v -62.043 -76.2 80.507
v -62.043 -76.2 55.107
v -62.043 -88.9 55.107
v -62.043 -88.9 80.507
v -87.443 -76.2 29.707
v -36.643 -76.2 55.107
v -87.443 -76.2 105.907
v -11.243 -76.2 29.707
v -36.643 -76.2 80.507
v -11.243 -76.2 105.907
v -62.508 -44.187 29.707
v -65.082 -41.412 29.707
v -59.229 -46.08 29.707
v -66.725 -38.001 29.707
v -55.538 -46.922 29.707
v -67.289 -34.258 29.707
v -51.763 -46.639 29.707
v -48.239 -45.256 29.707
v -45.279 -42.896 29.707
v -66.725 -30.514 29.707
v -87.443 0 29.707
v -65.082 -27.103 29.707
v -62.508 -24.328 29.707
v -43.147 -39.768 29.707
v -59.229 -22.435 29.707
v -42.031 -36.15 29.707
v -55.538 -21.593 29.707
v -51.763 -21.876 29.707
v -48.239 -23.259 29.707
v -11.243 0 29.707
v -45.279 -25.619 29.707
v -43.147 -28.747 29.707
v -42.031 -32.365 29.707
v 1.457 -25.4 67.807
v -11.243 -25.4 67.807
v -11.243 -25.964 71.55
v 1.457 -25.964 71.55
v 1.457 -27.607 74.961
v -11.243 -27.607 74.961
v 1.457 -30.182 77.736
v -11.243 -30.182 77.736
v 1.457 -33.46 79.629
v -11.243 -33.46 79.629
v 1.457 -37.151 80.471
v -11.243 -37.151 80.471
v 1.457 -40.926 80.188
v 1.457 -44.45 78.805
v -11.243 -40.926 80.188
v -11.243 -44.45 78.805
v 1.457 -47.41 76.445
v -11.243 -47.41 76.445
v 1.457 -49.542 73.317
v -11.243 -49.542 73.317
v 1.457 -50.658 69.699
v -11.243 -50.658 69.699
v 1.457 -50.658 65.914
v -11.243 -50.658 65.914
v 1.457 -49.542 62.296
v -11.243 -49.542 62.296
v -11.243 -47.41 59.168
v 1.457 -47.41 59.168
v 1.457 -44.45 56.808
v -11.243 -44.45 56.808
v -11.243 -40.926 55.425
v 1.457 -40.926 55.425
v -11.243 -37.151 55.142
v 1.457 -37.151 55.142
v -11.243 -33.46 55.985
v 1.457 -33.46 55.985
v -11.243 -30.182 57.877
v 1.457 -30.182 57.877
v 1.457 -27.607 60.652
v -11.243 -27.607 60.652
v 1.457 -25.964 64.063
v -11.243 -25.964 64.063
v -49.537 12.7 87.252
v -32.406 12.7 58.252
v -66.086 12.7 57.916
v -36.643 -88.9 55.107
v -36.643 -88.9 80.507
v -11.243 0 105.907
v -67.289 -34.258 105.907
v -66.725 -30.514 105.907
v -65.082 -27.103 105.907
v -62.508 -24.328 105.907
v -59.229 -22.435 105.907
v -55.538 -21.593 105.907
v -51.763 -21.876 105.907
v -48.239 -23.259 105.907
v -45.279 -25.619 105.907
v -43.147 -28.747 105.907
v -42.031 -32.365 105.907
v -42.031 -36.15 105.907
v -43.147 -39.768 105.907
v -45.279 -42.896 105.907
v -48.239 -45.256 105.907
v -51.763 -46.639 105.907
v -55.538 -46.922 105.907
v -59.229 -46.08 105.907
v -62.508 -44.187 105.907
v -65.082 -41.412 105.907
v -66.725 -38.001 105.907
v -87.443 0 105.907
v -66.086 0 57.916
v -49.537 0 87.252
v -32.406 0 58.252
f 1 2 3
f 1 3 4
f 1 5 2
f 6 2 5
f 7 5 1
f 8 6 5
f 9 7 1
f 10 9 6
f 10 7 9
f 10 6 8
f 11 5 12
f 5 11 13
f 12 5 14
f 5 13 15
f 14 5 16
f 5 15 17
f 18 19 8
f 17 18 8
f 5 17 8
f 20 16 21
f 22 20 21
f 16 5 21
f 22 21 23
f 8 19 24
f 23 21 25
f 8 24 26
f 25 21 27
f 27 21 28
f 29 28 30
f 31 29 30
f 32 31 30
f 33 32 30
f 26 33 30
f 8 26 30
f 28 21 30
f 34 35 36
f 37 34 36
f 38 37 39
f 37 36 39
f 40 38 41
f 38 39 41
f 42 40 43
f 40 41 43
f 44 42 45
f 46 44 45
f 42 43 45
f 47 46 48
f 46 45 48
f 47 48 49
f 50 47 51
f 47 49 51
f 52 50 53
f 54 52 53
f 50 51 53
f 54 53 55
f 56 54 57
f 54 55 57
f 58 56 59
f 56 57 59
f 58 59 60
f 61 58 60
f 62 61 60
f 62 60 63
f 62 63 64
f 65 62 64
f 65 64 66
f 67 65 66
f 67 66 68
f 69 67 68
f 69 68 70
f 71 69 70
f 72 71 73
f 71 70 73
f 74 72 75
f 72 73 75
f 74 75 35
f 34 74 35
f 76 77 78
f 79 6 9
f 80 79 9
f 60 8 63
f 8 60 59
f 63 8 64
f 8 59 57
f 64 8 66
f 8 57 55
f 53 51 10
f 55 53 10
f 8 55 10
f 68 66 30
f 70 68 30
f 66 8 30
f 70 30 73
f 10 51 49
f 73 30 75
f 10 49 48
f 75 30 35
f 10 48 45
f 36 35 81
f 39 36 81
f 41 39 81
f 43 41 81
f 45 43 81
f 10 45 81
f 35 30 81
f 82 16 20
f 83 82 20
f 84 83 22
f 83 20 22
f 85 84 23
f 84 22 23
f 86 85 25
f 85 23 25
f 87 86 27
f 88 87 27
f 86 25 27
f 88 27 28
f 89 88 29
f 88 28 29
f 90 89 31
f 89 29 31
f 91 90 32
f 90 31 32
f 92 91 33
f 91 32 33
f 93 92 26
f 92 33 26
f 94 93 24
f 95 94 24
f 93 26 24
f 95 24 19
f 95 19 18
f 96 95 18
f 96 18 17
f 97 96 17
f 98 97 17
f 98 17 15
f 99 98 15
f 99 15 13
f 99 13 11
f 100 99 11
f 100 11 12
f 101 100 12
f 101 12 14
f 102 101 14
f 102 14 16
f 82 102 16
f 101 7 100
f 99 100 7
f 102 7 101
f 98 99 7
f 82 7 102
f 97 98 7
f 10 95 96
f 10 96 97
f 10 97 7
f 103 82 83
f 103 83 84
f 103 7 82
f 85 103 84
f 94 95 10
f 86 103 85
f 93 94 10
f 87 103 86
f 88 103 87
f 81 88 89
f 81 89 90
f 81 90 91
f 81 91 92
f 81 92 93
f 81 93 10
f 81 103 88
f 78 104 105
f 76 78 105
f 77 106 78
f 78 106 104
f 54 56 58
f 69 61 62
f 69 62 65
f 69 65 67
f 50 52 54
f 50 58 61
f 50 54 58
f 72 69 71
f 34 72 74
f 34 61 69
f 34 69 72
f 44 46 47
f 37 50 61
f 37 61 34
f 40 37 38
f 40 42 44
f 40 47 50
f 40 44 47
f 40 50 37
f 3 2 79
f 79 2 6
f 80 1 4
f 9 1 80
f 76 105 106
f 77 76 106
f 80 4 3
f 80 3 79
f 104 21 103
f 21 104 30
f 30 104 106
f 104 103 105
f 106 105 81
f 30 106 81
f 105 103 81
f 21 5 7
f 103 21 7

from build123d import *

# Parameters (mm, degrees)
F0_W     = 76.2
F0_H     = 76.2
F1_DEPTH = 76.2
F2_R     = 12.7
F3_DEPTH = 12.7
F4_W     = 25.4
F4_H     = 25.4
F5_DEPTH = 12.7
F7_D     = 25.4
F9_DEPTH = 12.7


with BuildPart() as f1:
    # F0 (on Front) → F1 (new body)
    with BuildSketch(Plane.XZ):
        with Locations((-49.343084, 67.806647)):
            Rectangle(F0_W, F0_H)
    extrude(amount=F1_DEPTH)

    # F2 (on face) → F3 (join)
    with BuildSketch(Plane.YZ.offset(-11.243084)):
        with Locations((-38.1, 67.806647)):
            Circle(F2_R)
    extrude(amount=F3_DEPTH)

    # F4 (on face) → F5 (join)
    with BuildSketch(Plane.XZ.offset(76.2)):
        with Locations((-49.343084, 67.806647)):
            Rectangle(F4_W, F4_H)
    extrude(amount=F5_DEPTH)

    # F7 (through all)
    with Locations(Plane.XY.offset(105.906647)):
        with Locations((-54.589249, -34.257531)):
            Hole(F7_D / 2)

    # F8 (on face) → F9 (join)
    with BuildSketch(Plane(origin=(0, 0, 0), x_dir=(-1, 0, 0), z_dir=(0, 1, 0))):
        Polygon((66.085933, 57.915788), (49.537393, 87.251809), (32.405924, 58.252343), align=None)
    extrude(amount=F9_DEPTH)


solid = f1.part
